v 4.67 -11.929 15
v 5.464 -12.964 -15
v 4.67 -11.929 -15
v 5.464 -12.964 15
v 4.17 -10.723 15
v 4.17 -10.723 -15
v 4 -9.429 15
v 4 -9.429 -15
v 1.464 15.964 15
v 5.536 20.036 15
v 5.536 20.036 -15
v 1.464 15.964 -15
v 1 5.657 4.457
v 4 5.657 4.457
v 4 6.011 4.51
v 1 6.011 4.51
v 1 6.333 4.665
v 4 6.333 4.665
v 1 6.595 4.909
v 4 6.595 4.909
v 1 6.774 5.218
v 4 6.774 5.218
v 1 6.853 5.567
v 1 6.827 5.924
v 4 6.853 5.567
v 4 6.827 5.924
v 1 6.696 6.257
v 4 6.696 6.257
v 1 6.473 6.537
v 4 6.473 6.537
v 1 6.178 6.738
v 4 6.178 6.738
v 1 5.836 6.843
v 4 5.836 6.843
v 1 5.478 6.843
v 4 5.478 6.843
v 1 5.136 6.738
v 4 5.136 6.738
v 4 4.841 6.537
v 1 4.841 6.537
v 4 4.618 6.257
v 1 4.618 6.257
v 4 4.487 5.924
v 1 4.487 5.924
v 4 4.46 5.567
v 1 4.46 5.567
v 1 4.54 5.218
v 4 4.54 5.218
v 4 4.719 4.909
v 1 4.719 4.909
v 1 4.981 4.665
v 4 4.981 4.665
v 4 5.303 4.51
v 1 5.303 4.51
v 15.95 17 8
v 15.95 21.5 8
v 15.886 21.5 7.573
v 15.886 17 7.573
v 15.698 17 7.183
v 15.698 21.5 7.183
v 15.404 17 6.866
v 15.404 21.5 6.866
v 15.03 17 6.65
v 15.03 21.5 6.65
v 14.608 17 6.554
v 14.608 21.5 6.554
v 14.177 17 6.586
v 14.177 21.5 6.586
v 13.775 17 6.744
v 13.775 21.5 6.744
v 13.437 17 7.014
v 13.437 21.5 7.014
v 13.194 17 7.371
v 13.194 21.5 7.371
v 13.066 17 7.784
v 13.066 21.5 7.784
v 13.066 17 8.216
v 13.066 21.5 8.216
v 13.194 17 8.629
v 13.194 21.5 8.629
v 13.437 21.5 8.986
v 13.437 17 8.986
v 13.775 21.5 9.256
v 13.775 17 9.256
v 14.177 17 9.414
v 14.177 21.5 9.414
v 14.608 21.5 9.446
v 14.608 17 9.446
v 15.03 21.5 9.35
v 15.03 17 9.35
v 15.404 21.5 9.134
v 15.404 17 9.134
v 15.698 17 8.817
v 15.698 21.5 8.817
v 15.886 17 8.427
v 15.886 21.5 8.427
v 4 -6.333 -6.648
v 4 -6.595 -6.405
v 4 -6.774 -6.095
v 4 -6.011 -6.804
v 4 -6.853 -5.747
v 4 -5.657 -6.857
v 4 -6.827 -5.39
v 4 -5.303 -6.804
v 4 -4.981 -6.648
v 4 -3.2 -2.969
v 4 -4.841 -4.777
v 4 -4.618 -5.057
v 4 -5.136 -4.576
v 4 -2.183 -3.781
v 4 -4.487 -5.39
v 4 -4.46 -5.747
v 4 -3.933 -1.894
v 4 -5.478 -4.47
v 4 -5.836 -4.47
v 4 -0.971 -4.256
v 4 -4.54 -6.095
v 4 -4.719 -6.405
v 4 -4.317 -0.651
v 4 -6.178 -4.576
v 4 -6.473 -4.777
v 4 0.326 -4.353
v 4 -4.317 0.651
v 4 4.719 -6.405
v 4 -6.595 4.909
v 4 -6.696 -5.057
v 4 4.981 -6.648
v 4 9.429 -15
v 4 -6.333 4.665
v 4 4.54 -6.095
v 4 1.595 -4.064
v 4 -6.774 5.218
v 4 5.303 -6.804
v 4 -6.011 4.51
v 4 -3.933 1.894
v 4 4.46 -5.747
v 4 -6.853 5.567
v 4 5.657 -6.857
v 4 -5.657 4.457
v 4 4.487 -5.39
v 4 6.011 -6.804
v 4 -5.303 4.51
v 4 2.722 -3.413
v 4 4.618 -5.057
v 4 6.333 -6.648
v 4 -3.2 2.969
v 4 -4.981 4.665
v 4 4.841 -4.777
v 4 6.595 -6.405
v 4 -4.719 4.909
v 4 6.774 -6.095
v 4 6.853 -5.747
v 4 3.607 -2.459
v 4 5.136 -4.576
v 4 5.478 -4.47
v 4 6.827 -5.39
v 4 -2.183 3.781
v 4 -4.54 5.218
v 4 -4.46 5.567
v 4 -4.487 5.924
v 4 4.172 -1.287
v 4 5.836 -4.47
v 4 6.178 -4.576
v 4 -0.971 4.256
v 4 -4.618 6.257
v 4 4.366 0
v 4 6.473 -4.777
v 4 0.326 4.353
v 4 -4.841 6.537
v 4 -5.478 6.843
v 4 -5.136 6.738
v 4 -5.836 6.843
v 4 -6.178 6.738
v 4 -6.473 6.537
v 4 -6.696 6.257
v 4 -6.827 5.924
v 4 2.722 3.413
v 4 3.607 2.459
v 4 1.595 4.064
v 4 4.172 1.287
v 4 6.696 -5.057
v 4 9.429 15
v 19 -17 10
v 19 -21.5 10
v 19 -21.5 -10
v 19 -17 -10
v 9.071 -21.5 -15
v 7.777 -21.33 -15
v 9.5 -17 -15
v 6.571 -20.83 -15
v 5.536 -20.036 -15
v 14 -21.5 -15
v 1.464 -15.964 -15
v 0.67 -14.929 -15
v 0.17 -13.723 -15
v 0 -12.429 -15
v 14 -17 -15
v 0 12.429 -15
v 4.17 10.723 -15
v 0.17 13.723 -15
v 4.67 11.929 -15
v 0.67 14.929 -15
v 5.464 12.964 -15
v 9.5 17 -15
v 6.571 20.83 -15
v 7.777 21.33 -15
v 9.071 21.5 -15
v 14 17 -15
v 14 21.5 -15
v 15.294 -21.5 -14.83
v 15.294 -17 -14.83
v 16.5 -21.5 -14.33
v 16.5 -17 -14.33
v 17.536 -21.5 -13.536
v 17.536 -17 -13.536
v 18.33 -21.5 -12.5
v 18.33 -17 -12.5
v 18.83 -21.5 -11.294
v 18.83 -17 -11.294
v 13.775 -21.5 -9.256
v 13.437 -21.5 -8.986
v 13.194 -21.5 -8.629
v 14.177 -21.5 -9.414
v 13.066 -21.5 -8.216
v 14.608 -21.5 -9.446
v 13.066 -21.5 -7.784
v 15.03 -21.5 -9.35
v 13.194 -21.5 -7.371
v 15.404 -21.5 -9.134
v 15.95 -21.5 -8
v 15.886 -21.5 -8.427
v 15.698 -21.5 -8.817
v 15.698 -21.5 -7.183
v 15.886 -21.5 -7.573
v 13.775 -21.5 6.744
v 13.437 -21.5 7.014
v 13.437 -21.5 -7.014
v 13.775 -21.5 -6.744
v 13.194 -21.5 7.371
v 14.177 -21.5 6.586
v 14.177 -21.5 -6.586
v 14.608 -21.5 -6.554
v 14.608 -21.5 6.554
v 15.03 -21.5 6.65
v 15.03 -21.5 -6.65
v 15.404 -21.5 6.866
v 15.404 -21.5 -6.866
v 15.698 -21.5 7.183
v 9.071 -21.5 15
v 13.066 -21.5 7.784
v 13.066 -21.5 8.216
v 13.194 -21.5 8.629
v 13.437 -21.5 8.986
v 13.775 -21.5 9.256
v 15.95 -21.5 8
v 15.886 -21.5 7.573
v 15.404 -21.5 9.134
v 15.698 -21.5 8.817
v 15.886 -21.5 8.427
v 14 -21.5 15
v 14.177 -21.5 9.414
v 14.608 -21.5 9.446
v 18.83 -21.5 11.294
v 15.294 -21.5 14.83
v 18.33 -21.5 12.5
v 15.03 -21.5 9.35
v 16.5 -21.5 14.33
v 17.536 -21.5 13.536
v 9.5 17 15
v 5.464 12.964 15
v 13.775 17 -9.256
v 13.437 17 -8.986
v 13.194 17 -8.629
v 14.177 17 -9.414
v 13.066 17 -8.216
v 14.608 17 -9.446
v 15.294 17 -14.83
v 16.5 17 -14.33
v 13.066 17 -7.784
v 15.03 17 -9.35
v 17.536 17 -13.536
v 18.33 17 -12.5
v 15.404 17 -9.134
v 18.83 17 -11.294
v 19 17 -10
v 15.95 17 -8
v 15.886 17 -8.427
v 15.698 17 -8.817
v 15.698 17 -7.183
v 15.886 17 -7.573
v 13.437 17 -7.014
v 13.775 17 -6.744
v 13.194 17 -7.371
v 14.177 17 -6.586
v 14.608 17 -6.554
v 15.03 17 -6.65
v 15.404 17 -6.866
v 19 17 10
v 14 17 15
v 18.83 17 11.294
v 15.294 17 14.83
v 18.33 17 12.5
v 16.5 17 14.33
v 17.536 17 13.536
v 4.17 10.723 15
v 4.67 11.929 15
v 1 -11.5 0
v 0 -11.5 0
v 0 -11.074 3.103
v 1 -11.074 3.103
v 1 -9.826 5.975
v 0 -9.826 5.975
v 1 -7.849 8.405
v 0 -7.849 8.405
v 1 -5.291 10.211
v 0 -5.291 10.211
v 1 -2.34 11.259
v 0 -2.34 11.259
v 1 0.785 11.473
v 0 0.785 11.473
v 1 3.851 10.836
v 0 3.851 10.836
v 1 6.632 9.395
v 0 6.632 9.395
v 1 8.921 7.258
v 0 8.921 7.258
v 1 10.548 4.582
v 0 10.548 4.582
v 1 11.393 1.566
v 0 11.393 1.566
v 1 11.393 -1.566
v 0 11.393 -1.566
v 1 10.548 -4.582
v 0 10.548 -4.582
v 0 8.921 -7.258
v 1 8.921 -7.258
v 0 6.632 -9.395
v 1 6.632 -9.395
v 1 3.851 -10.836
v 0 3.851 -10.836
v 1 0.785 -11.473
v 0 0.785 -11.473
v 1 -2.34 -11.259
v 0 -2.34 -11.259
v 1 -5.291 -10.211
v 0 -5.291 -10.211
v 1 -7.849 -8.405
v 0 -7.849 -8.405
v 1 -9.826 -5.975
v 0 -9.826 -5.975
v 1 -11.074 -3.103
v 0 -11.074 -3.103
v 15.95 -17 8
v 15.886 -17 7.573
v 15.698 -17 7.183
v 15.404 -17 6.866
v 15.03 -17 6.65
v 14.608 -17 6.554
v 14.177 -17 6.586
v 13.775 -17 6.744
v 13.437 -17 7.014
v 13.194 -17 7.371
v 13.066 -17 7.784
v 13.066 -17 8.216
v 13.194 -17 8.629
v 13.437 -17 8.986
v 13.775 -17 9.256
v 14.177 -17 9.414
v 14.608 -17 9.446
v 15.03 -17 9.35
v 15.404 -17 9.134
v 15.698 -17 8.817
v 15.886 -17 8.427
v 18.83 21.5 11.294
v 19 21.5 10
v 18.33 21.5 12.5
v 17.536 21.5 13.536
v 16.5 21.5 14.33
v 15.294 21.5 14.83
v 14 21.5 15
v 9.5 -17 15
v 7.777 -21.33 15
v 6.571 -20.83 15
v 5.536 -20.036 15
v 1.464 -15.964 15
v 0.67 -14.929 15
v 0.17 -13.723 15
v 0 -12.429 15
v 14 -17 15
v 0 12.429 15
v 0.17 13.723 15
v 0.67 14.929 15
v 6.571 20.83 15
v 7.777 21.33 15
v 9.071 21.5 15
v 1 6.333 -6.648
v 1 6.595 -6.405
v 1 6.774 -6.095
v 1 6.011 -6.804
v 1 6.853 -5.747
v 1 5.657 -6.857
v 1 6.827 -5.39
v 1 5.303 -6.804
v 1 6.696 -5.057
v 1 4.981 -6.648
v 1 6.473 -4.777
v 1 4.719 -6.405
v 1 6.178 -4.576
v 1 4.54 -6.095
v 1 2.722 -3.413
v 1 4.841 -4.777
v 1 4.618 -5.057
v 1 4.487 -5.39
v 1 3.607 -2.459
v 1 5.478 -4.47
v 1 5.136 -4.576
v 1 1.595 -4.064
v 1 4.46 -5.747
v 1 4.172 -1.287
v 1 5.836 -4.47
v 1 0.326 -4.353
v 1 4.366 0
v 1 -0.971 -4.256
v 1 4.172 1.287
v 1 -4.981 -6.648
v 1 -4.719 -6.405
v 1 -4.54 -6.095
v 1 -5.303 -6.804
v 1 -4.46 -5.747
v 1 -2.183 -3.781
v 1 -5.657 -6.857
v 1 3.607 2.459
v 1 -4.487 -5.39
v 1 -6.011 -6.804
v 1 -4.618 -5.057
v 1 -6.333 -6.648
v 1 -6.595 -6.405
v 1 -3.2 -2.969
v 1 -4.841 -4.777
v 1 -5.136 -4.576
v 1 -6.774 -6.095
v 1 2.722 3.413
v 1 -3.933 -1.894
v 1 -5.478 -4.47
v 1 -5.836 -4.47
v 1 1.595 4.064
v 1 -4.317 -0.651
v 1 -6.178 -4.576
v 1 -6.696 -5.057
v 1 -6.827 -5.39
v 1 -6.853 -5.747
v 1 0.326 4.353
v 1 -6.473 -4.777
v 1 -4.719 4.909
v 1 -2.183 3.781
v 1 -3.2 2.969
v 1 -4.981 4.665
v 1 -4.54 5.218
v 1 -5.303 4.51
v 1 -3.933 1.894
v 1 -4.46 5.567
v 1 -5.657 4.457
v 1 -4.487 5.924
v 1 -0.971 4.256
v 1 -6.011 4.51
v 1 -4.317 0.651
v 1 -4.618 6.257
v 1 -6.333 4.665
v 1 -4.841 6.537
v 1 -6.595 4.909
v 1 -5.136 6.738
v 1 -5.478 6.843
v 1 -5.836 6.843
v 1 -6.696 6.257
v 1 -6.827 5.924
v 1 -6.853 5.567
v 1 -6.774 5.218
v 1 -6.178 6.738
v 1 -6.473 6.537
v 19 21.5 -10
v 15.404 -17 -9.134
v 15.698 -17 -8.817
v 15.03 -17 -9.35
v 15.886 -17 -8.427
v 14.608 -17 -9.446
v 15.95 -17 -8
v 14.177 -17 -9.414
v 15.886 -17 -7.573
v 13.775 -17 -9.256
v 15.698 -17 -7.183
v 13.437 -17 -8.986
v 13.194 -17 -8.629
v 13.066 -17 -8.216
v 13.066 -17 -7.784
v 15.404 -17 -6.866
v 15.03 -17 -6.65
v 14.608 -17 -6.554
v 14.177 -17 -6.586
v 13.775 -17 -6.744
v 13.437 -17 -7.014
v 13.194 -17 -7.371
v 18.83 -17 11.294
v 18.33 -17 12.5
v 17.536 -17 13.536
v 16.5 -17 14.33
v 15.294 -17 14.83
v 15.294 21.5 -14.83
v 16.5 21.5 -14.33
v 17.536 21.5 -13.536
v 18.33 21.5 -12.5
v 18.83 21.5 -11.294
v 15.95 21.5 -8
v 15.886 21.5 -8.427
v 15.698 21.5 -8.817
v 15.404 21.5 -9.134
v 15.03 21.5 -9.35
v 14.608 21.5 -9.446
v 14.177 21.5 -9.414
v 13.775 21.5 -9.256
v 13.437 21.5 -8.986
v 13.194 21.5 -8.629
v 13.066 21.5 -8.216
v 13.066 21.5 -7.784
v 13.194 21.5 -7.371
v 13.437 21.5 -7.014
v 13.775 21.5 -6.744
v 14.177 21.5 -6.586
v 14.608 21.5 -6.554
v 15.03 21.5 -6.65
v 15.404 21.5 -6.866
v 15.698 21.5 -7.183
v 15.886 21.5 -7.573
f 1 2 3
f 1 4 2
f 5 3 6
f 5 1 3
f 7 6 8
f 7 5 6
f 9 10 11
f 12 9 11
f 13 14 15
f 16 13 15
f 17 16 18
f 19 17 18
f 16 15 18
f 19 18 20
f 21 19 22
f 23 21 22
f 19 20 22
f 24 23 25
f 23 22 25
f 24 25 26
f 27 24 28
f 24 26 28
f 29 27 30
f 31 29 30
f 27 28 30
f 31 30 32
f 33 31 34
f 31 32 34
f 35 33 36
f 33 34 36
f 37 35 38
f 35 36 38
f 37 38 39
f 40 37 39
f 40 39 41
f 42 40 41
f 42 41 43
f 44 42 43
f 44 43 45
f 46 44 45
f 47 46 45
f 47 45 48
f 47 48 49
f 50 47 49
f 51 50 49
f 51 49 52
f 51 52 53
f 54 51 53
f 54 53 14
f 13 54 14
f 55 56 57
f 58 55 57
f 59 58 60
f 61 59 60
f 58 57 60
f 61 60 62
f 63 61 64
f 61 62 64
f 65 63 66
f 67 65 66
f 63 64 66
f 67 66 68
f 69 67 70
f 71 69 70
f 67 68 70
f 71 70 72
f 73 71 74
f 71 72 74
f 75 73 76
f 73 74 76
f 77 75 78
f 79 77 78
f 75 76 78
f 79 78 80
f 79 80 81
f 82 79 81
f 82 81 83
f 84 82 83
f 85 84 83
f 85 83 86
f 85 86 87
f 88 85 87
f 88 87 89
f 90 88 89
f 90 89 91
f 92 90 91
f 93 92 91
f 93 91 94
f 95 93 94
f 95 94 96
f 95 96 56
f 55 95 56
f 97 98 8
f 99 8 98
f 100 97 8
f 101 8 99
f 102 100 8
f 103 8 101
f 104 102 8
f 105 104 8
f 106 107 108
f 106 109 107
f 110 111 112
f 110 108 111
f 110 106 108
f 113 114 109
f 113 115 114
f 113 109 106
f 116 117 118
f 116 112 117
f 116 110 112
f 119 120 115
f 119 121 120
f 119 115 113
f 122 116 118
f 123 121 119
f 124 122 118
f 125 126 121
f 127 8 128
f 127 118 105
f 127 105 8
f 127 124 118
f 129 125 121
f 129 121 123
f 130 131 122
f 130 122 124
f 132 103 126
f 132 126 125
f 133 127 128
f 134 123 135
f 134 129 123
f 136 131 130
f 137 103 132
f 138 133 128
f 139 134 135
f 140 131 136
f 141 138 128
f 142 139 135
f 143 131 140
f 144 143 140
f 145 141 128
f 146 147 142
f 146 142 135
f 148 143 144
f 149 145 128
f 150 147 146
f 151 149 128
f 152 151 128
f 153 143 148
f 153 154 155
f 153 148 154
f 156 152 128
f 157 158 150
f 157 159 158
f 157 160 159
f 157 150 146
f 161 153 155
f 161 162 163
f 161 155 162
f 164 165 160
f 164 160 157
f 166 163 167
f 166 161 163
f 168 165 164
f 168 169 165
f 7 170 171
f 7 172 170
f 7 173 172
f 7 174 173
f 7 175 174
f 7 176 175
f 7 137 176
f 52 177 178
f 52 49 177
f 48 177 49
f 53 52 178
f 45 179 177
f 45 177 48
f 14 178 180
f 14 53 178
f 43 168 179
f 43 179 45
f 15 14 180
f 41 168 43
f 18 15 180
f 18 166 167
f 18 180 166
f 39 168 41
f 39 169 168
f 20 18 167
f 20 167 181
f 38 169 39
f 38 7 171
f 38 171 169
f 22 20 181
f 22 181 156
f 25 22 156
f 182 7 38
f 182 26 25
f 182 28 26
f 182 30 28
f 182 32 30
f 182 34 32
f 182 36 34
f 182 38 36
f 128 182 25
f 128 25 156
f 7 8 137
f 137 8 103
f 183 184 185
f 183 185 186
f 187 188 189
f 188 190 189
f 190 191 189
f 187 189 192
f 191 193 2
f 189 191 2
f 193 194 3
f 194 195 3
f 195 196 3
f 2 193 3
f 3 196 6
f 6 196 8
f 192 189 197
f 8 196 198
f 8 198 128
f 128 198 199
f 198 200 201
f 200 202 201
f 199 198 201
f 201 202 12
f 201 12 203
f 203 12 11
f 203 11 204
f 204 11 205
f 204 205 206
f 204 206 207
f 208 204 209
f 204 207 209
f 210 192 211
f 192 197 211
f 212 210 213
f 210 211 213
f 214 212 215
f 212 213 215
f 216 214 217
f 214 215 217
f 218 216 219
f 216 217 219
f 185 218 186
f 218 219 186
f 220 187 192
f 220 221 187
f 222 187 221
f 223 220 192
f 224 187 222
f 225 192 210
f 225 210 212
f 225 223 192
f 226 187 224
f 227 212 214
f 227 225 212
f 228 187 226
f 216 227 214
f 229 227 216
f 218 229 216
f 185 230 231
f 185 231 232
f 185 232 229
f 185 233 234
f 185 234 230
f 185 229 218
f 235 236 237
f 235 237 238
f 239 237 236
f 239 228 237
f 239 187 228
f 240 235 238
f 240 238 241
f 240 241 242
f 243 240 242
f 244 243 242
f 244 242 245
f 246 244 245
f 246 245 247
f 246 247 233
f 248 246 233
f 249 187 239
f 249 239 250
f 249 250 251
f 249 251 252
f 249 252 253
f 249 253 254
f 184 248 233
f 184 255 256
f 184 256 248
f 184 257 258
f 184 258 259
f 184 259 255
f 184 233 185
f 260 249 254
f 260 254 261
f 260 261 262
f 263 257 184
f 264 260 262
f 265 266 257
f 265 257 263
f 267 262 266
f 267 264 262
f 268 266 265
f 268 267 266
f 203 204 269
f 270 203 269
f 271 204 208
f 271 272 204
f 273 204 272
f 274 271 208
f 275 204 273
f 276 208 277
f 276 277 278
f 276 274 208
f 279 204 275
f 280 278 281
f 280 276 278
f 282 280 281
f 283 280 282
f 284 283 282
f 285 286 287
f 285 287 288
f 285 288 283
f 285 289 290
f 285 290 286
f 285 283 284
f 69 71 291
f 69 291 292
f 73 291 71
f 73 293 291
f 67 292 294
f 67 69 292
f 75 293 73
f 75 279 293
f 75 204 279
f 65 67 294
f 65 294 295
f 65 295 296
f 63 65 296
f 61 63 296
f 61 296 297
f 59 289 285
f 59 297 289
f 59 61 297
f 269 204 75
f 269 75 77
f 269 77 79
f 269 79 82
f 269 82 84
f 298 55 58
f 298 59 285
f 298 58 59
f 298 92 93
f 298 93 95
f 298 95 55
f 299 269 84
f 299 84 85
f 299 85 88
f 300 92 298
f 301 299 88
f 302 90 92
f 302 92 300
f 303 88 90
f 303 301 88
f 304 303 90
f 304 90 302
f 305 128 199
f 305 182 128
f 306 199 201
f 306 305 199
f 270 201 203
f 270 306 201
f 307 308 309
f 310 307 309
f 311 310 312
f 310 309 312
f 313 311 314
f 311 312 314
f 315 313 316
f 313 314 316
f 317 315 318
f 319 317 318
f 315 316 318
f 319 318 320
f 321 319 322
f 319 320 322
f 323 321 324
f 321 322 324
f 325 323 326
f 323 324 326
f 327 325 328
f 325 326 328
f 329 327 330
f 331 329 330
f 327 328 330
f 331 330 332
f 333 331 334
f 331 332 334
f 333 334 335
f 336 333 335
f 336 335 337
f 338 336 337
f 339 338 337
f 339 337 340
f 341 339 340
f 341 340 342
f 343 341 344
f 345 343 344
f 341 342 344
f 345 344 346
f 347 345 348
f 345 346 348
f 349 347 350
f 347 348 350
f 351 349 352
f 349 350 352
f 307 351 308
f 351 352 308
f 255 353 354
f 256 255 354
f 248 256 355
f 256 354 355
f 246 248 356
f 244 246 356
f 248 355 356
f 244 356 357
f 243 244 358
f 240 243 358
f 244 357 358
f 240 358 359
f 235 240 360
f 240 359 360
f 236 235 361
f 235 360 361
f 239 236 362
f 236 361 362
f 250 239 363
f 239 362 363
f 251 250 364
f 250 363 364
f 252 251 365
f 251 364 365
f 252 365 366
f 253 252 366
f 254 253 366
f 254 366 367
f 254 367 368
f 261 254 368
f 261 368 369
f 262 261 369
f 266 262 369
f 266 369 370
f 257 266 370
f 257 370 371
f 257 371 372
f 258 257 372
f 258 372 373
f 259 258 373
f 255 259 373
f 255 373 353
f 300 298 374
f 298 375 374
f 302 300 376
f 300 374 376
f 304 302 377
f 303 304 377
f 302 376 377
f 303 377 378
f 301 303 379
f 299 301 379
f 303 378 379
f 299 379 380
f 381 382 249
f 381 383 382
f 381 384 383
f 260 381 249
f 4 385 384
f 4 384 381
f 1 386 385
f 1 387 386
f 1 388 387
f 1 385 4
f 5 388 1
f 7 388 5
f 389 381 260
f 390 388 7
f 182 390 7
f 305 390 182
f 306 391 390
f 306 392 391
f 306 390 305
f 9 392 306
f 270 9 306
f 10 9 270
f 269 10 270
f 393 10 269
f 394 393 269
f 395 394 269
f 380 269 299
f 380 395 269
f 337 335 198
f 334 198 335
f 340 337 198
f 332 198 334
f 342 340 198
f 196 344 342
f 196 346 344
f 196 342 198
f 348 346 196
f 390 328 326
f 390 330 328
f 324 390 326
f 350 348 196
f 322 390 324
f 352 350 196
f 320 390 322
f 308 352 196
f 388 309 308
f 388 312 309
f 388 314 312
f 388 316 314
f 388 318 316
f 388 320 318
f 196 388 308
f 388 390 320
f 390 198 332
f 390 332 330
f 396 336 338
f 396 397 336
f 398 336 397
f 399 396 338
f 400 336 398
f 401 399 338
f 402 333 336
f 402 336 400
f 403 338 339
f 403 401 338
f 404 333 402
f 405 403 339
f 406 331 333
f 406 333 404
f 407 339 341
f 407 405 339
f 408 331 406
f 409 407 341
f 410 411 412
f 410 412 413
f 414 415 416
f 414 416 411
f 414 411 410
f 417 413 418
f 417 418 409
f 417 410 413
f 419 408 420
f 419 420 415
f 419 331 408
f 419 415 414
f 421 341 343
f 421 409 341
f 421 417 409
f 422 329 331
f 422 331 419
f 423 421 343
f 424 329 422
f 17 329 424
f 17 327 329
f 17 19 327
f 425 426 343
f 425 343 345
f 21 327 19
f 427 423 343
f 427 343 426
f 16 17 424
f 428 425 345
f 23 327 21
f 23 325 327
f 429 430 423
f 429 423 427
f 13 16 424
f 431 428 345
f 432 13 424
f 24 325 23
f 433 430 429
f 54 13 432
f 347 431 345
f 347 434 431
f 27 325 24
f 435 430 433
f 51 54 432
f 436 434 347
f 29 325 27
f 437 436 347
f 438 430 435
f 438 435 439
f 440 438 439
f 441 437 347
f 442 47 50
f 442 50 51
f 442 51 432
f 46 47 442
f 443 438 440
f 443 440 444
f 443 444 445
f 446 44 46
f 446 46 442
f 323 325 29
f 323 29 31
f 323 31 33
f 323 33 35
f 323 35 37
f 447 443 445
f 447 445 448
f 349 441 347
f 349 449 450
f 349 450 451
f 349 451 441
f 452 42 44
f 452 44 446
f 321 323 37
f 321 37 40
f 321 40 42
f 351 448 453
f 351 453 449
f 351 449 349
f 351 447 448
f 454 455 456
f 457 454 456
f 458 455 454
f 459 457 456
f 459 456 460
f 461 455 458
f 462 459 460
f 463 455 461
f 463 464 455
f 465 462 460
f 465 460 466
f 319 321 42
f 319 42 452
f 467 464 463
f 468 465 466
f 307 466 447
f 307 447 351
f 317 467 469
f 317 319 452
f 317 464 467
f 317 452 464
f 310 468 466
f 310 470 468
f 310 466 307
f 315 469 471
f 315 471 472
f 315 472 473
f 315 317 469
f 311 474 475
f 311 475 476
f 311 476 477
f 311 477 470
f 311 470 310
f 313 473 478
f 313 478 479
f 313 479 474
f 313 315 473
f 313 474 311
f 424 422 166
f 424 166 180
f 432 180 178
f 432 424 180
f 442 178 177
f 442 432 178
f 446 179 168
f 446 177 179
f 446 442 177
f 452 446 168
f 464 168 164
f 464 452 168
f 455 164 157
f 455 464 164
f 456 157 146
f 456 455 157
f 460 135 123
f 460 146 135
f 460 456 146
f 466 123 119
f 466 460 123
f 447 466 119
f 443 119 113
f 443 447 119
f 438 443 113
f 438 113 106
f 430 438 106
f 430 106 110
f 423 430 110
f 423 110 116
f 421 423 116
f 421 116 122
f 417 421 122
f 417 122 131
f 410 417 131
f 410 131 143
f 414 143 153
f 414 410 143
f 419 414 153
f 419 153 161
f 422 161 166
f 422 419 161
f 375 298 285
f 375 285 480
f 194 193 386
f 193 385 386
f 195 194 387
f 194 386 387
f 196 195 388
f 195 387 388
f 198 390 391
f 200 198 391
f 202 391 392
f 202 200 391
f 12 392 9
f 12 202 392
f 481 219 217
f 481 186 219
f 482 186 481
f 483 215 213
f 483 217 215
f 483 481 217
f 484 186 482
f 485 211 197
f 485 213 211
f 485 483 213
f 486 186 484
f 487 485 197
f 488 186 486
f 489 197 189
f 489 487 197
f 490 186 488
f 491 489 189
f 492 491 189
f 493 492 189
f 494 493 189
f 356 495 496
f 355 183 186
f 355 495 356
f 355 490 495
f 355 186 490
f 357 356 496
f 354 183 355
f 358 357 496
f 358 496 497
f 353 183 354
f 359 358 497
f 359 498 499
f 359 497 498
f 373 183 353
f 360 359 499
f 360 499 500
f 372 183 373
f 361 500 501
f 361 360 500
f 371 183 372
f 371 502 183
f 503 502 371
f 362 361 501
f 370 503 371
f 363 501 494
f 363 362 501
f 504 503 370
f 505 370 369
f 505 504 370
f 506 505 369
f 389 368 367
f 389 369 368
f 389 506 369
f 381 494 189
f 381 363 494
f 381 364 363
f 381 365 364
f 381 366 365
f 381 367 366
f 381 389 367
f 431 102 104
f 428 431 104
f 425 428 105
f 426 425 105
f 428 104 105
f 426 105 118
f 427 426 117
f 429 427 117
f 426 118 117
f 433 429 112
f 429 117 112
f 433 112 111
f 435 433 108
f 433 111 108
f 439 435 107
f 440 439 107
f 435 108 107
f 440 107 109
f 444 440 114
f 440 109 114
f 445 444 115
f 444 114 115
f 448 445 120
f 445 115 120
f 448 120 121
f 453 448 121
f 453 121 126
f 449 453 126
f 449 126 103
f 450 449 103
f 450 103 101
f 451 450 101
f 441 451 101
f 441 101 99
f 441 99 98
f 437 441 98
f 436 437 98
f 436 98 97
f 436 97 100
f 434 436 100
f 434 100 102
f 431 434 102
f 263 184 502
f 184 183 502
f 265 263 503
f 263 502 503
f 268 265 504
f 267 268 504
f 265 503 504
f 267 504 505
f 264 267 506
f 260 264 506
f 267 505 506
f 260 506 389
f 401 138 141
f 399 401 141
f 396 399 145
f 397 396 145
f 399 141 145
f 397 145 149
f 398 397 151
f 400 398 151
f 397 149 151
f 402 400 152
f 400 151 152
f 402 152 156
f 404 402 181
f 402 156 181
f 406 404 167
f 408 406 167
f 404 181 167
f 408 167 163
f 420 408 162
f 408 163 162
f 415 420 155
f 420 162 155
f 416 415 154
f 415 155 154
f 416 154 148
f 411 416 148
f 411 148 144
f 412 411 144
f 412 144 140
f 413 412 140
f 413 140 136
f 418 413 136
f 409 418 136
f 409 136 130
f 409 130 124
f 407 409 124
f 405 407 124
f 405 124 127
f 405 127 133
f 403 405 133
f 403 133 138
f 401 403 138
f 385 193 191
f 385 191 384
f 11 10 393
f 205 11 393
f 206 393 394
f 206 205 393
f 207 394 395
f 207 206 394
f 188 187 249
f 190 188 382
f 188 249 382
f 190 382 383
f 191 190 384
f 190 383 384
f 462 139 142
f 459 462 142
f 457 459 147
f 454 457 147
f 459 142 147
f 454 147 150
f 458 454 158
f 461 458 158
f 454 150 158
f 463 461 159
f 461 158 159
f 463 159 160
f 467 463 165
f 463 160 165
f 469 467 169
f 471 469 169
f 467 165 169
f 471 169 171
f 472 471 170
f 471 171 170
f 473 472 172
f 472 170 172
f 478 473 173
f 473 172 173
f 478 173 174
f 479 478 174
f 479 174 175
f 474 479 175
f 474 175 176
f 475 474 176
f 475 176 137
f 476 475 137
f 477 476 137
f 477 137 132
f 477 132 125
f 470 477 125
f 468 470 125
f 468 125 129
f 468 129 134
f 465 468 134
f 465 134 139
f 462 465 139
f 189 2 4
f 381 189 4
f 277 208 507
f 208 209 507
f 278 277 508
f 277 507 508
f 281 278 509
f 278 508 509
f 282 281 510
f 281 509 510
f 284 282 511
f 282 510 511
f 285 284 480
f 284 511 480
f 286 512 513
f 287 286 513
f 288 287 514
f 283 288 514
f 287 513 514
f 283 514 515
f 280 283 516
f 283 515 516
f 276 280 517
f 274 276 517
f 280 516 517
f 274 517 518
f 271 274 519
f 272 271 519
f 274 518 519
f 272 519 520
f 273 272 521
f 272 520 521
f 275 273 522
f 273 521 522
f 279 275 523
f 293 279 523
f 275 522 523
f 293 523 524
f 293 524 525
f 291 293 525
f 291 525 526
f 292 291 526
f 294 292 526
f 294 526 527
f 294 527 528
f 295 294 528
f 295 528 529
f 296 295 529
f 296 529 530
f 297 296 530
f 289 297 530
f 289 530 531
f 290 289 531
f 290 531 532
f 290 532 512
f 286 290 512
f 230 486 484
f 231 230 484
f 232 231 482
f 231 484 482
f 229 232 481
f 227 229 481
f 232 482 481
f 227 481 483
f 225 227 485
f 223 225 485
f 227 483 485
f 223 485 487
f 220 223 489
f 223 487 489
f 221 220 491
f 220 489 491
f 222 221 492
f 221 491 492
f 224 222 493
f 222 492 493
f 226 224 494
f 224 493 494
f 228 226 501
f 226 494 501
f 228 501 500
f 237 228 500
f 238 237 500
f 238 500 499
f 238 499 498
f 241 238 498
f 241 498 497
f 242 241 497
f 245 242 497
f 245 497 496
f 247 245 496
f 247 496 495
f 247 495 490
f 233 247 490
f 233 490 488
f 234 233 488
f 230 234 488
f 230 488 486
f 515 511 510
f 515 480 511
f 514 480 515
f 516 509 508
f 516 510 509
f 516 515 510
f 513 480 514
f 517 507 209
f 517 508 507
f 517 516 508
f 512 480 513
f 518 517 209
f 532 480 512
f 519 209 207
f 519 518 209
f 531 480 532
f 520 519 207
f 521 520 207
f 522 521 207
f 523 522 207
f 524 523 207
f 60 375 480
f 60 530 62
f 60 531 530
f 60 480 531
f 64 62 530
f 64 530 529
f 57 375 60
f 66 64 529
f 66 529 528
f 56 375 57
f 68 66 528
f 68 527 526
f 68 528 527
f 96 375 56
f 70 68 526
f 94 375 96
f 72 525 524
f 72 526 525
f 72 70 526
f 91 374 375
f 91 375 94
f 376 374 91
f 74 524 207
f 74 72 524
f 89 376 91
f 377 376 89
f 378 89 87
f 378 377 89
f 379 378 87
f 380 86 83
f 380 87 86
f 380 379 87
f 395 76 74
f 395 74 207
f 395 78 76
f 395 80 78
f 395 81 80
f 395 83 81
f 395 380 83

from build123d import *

# Parameters (mm, degrees)
BOSS_EXTRUDE1_DEPTH     = 15
M2_5_CLEARANCE_HOLE1_D  = 2.9
CUT_EXTRUDE1_DEPTH      = 31.203476621
CUT_EXTRUDE1_DEPTH_BACK = 31.203476621
SKETCH3_R               = 4.365625
M2_CLEARANCE_HOLE1_D    = 2.4
SKETCH10_R              = 11.5
CUT_EXTRUDE3_DEPTH      = 1
CHAMFER1_SIZE           = 5.5
CHAMFER2_SIZE           = 7
FILLET1_R               = 5
FILLET2_R               = 5


with BuildPart() as part:
    # Sketch2 → Boss-Extrude1 (new, symmetric)
    with BuildSketch(Plane.XY):
        Polygon((0, 21.5), (0, -21.5), (19, -21.5), (19, -17), (4, -17), (4, 17), (19, 17), (19, 21.5), align=None)
    extrude(amount=BOSS_EXTRUDE1_DEPTH, both=True)

    # M2.5 Clearance Hole1 (through all)
    with Locations(Plane(origin=(0, -21.5, 0), x_dir=(-1, 0, 0), z_dir=(0, -1, 0))):
        with Locations((-14.5, -8), (-14.5, 8)):
            Hole(M2_5_CLEARANCE_HOLE1_D / 2)

    # Sketch3 → Cut-Extrude1 (cut, two sides: drawn at the far end of the back side and taken through both)
    with BuildSketch(Plane(origin=(4, 0, 0), x_dir=(0, 0, -1), z_dir=(1, 0, 0)).offset(-CUT_EXTRUDE1_DEPTH_BACK)):
        with Locations(Location((0, 0, 0), (0, 0, 90))):
            Circle(SKETCH3_R)
    extrude(amount=CUT_EXTRUDE1_DEPTH + CUT_EXTRUDE1_DEPTH_BACK, mode=Mode.SUBTRACT)

    # M2 Clearance Hole1 (through all)
    with Locations(Plane.ZY):
        with Locations((5.656854249, 5.656854249), (5.656854249, -5.656854249), (-5.656854249, -5.656854249), (-5.656854249, 5.656854249), (0, 0)):
            Hole(M2_CLEARANCE_HOLE1_D / 2)

    # Sketch10 → Cut-Extrude3 (cut)
    with BuildSketch(Plane.ZY):
        with Locations(Location((0, 0, 0), (0, 0, 270))):
            Circle(SKETCH10_R)
    extrude(amount=-CUT_EXTRUDE3_DEPTH, mode=Mode.SUBTRACT)

    # Chamfer1
    chamfer1_edges = [part.edges().sort_by_distance(p)[0] for p in [
        (4, 17, 0),
        (4, -17, 0),
    ]]
    chamfer(chamfer1_edges, length=CHAMFER1_SIZE)

    # Chamfer2
    chamfer2_edges = [part.edges().sort_by_distance(p)[0] for p in [
        (0, -21.5, 0),
        (0, 21.5, 0),
    ]]
    chamfer(chamfer2_edges, length=CHAMFER2_SIZE)

    # Fillet1
    fillet1_edges = [part.edges().sort_by_distance(p)[0] for p in [
        (19, -19.25, -15),
        (19, 19.25, 15),
        (19, -19.25, 15),
        (19, 19.25, -15),
    ]]
    fillet(fillet1_edges, radius=FILLET1_R)

    # Fillet2
    fillet2_edges = [part.edges().sort_by_distance(p)[0] for p in [
        (0, -14.5, 0),
        (0, 14.5, 0),
        (7, 21.5, 0),
        (7, -21.5, 0),
        (4, 11.5, 0),
        (4, -11.5, 0),
    ]]
    fillet(fillet2_edges, radius=FILLET2_R)


solid = part.part
